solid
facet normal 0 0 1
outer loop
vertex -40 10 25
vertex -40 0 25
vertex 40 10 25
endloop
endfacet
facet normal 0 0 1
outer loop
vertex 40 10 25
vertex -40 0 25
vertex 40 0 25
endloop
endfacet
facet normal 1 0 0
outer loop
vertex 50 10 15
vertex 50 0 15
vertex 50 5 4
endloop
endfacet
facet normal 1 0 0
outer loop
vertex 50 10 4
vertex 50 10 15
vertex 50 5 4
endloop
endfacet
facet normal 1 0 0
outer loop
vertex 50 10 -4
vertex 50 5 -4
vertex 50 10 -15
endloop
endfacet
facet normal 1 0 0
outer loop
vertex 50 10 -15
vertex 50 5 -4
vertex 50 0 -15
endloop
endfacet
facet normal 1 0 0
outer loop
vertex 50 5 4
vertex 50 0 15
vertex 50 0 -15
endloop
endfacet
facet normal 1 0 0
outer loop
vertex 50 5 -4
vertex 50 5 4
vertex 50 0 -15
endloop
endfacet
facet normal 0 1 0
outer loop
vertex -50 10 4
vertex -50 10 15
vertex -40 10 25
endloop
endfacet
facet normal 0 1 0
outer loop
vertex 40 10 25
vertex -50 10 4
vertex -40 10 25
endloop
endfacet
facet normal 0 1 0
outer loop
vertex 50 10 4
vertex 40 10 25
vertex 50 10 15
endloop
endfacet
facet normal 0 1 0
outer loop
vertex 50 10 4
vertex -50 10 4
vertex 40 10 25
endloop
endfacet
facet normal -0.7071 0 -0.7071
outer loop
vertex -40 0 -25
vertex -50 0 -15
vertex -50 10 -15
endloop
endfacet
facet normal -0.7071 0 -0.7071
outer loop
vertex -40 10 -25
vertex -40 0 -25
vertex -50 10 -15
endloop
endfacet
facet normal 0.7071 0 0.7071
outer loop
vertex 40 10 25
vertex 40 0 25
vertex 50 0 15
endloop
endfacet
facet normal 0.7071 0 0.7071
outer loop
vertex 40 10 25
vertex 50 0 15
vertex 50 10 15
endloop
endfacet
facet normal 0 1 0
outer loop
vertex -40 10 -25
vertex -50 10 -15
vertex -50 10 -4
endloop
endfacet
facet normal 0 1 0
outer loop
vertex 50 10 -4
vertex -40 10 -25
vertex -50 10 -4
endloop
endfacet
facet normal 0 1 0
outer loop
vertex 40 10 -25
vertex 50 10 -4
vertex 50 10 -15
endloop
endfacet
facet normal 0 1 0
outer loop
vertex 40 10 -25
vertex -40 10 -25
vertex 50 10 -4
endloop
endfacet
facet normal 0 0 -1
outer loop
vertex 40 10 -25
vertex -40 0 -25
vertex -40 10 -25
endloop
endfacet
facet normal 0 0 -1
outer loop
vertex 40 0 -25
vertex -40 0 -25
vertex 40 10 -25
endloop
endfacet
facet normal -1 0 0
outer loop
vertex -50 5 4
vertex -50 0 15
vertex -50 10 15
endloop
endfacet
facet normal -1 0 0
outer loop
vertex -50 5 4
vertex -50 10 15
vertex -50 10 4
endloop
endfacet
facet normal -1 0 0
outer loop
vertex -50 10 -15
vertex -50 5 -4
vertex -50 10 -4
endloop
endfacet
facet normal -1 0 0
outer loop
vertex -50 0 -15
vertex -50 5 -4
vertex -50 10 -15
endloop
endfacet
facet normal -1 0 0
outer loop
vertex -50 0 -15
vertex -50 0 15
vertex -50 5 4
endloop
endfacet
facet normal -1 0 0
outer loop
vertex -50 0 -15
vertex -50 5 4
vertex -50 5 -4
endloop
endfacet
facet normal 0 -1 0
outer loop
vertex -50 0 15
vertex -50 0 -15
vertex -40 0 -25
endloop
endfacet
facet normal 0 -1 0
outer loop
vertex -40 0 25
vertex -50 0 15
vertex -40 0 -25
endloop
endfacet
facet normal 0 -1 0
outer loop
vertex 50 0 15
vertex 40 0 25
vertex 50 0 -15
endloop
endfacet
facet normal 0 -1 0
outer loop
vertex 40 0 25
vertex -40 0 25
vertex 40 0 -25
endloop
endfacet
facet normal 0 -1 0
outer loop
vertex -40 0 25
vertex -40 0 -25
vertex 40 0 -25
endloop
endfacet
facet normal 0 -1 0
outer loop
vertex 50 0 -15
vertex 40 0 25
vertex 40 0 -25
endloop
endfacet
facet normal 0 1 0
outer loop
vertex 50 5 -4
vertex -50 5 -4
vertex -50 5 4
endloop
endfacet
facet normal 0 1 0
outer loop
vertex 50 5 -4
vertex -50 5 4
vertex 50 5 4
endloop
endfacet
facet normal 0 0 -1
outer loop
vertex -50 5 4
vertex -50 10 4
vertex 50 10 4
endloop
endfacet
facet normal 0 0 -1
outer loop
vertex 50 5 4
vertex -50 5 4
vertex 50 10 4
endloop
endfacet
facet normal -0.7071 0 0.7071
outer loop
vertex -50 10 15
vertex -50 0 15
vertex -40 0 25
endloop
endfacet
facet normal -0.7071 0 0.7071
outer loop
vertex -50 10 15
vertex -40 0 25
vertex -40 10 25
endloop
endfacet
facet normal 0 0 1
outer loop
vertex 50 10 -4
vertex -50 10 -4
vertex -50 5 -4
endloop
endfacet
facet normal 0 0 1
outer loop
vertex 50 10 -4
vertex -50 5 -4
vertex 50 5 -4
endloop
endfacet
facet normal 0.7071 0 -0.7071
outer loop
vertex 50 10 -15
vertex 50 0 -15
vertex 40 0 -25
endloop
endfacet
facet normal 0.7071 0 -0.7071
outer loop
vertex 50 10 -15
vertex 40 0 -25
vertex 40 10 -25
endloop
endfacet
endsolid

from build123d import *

# Parameters (mm, degrees)
SKETCH1_W           = 100
SKETCH1_H           = 50
BOSS_EXTRUDE1_DEPTH = 10
CHAMFER1_SIZE       = 10
SKETCH2_W           = 113.165724781
SKETCH2_H           = 8
CUT_EXTRUDE1_DEPTH  = 5


with BuildPart() as part:
    # Sketch1 → Boss-Extrude1 (new body)
    with BuildSketch(Plane(origin=(0, 0, 0), x_dir=(1, 0, 0), z_dir=(0, 1, 0))):
        Rectangle(SKETCH1_W, SKETCH1_H)
    extrude(amount=BOSS_EXTRUDE1_DEPTH)

    # Chamfer1
    chamfer1_edges = [part.edges().sort_by_distance(p)[0] for p in [
        (-50, 5, -25),
        (50, 5, -25),
        (50, 5, 25),
        (-50, 5, 25),
    ]]
    chamfer(chamfer1_edges, length=CHAMFER1_SIZE)

    # Sketch2 → Cut-Extrude1 (cut)
    with BuildSketch(Plane(origin=(0, 10, 0), x_dir=(1, 0, 0), z_dir=(0, 1, 0))):
        with Locations((-1.797960114, 0)):
            Rectangle(SKETCH2_W, SKETCH2_H)
    extrude(amount=-CUT_EXTRUDE1_DEPTH, mode=Mode.SUBTRACT)


solid = part.part
